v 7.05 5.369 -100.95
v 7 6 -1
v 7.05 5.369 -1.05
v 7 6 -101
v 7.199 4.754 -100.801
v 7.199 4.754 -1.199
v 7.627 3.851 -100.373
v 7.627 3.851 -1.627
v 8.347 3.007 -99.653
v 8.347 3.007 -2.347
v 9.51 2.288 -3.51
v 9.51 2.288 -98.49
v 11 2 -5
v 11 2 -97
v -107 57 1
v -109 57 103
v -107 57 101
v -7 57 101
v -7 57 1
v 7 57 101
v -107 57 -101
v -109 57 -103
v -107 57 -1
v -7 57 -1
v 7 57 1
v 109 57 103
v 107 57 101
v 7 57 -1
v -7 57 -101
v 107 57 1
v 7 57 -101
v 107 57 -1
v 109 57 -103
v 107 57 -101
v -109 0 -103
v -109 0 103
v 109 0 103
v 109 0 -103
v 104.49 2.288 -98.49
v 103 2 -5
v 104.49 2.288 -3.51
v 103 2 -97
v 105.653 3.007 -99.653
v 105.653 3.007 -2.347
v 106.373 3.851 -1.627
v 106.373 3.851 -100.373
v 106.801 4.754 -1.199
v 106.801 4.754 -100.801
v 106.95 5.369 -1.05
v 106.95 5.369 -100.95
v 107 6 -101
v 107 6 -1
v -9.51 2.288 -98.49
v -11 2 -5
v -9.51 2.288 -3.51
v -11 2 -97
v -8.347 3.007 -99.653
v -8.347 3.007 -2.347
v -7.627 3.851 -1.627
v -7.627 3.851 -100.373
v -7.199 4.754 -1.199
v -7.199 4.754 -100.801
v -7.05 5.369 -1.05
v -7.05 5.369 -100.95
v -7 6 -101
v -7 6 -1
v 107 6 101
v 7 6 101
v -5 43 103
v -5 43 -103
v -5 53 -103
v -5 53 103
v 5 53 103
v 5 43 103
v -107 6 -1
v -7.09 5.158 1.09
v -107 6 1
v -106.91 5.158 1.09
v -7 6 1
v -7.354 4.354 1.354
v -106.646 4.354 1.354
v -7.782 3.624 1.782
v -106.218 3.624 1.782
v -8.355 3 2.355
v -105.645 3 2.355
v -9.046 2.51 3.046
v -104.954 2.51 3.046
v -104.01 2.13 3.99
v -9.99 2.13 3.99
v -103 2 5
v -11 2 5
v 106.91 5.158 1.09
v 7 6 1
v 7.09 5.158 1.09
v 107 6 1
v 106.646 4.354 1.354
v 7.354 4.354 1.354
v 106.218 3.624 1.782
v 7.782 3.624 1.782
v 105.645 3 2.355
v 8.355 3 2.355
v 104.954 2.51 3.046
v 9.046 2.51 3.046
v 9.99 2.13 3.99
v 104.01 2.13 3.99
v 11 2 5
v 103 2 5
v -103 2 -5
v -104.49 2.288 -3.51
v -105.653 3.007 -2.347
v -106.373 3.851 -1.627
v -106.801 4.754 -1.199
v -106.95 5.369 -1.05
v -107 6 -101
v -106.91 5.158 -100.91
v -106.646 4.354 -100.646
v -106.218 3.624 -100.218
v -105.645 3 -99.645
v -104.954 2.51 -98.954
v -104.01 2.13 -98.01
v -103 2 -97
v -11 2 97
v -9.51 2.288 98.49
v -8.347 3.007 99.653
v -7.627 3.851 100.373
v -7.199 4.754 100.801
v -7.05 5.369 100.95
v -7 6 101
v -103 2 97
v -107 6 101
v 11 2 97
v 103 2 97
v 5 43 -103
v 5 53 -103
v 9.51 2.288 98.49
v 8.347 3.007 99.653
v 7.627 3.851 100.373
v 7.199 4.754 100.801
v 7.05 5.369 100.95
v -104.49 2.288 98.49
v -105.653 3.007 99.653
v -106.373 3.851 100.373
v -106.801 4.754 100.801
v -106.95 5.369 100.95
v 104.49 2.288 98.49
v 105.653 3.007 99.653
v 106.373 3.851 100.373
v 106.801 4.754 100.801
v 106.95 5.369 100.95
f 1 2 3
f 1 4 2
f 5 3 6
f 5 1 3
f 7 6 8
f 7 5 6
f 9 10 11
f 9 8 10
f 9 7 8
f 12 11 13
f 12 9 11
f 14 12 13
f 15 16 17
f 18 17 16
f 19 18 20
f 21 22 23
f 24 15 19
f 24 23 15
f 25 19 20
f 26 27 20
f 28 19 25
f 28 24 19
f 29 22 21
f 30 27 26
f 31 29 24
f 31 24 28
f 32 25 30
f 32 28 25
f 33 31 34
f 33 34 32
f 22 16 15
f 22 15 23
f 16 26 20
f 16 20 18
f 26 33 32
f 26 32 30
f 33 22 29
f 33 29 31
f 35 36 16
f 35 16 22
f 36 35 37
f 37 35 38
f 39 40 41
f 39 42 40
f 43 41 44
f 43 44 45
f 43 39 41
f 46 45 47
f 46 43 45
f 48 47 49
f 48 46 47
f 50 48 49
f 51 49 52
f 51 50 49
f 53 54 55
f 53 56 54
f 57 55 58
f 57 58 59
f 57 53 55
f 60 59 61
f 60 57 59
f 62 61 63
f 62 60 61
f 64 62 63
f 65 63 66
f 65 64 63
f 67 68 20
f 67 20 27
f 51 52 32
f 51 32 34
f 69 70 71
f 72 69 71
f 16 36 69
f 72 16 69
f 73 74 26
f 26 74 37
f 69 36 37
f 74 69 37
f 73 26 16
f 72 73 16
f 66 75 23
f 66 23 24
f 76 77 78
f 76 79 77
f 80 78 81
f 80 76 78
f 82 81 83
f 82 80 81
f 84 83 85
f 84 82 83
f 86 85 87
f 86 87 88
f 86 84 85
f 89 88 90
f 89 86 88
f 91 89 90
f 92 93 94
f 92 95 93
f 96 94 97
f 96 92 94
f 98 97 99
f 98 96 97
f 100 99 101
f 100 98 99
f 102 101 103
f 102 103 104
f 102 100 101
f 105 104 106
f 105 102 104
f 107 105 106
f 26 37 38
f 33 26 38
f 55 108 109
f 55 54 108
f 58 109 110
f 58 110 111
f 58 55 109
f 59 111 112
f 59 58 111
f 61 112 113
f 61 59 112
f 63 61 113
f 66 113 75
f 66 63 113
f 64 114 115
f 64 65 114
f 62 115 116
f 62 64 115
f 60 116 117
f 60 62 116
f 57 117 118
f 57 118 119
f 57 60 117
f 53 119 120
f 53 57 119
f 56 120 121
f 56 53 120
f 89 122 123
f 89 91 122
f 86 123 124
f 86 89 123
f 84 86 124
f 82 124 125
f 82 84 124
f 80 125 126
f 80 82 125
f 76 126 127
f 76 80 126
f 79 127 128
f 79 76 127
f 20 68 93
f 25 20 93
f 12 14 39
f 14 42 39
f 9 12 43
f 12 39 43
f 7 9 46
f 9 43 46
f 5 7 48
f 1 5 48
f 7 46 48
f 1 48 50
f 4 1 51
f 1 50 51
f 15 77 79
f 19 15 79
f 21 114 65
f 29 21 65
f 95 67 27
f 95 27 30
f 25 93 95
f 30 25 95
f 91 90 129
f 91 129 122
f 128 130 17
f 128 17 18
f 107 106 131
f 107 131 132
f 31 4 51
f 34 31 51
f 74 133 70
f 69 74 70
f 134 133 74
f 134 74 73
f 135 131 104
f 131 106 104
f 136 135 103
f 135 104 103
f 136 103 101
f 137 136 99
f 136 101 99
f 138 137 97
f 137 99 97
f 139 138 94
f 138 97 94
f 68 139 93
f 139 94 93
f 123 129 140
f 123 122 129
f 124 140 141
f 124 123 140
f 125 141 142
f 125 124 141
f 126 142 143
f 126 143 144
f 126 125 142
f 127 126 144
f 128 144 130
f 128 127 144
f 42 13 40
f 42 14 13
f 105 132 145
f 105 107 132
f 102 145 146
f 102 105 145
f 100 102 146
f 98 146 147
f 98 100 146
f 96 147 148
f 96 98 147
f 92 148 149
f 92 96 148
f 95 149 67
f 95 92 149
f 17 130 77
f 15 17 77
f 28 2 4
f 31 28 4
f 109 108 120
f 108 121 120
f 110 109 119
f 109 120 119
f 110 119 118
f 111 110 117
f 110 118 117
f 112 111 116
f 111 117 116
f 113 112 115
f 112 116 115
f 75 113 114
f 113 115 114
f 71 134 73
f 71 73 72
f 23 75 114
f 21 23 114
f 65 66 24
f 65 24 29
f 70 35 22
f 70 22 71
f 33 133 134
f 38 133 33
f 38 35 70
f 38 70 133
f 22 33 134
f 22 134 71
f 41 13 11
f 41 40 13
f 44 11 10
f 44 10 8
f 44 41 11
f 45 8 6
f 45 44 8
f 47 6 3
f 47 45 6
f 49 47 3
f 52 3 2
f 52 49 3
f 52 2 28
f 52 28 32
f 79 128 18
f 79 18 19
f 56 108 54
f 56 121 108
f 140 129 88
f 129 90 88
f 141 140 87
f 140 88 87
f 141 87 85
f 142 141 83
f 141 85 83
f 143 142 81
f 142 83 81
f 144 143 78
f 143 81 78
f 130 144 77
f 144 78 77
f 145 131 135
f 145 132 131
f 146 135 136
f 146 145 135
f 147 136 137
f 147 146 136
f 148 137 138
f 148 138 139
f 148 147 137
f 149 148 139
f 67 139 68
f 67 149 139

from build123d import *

# Parameters (mm, degrees)
SKETCH1_W           = 218
SKETCH1_H           = 206
SKETCH1_W_2         = 100
SKETCH1_H_2         = 100
BOSS_EXTRUDE1_DEPTH = 57
SKETCH2_W           = 218
SKETCH2_H           = 206
BOSS_EXTRUDE2_DEPTH = 2
FILLET1_R           = 4
SKETCH3_W           = 10
SKETCH3_H           = 10
CUT_EXTRUDE1_DEPTH  = 240.929156211


with BuildPart() as part:
    # Sketch1 → Boss-Extrude1 (new body)
    with BuildSketch(Plane(origin=(0, 0, 0), x_dir=(1, 0, 0), z_dir=(0, 1, 0))):
        Rectangle(SKETCH1_W, SKETCH1_H)
        with Locations((-57, -51)):
            Rectangle(SKETCH1_W_2, SKETCH1_H_2, mode=Mode.SUBTRACT)
        with Locations((57, -51)):
            Rectangle(SKETCH1_W_2, SKETCH1_H_2, mode=Mode.SUBTRACT)
        with Locations((-57, 51)):
            Rectangle(SKETCH1_W_2, SKETCH1_H_2, mode=Mode.SUBTRACT)
        with Locations((57, 51)):
            Rectangle(SKETCH1_W_2, SKETCH1_H_2, mode=Mode.SUBTRACT)
    extrude(amount=BOSS_EXTRUDE1_DEPTH)

    # Sketch2 → Boss-Extrude2 (add)
    with BuildSketch(Plane(origin=(0, 0, 0), x_dir=(1, 0, 0), z_dir=(0, 1, 0))):
        Rectangle(SKETCH2_W, SKETCH2_H)
    extrude(amount=BOSS_EXTRUDE2_DEPTH)

    # Fillet1
    fillet1_edges = [part.edges().sort_by_distance(p)[0] for p in [
        (57, 2, -1),
        (-57, 2, 1),
        (-107, 2, 51),
        (-57, 2, 101),
        (-7, 2, 51),
        (57, 2, 1),
        (7, 2, 51),
        (57, 2, 101),
        (107, 2, 51),
        (-57, 2, -1),
        (-7, 2, -51),
        (-57, 2, -101),
        (-107, 2, -51),
        (107, 2, -51),
        (57, 2, -101),
        (7, 2, -51),
    ]]
    fillet(fillet1_edges, radius=FILLET1_R)

    # Sketch3 → Cut-Extrude1 (cut, through all)
    with BuildSketch(Plane(origin=(0, 0, -103), x_dir=(-1, 0, 0), z_dir=(0, 0, -1))):
        with Locations((0, 48)):
            Rectangle(SKETCH3_W, SKETCH3_H)
    extrude(amount=-CUT_EXTRUDE1_DEPTH, mode=Mode.SUBTRACT)


solid = part.part
